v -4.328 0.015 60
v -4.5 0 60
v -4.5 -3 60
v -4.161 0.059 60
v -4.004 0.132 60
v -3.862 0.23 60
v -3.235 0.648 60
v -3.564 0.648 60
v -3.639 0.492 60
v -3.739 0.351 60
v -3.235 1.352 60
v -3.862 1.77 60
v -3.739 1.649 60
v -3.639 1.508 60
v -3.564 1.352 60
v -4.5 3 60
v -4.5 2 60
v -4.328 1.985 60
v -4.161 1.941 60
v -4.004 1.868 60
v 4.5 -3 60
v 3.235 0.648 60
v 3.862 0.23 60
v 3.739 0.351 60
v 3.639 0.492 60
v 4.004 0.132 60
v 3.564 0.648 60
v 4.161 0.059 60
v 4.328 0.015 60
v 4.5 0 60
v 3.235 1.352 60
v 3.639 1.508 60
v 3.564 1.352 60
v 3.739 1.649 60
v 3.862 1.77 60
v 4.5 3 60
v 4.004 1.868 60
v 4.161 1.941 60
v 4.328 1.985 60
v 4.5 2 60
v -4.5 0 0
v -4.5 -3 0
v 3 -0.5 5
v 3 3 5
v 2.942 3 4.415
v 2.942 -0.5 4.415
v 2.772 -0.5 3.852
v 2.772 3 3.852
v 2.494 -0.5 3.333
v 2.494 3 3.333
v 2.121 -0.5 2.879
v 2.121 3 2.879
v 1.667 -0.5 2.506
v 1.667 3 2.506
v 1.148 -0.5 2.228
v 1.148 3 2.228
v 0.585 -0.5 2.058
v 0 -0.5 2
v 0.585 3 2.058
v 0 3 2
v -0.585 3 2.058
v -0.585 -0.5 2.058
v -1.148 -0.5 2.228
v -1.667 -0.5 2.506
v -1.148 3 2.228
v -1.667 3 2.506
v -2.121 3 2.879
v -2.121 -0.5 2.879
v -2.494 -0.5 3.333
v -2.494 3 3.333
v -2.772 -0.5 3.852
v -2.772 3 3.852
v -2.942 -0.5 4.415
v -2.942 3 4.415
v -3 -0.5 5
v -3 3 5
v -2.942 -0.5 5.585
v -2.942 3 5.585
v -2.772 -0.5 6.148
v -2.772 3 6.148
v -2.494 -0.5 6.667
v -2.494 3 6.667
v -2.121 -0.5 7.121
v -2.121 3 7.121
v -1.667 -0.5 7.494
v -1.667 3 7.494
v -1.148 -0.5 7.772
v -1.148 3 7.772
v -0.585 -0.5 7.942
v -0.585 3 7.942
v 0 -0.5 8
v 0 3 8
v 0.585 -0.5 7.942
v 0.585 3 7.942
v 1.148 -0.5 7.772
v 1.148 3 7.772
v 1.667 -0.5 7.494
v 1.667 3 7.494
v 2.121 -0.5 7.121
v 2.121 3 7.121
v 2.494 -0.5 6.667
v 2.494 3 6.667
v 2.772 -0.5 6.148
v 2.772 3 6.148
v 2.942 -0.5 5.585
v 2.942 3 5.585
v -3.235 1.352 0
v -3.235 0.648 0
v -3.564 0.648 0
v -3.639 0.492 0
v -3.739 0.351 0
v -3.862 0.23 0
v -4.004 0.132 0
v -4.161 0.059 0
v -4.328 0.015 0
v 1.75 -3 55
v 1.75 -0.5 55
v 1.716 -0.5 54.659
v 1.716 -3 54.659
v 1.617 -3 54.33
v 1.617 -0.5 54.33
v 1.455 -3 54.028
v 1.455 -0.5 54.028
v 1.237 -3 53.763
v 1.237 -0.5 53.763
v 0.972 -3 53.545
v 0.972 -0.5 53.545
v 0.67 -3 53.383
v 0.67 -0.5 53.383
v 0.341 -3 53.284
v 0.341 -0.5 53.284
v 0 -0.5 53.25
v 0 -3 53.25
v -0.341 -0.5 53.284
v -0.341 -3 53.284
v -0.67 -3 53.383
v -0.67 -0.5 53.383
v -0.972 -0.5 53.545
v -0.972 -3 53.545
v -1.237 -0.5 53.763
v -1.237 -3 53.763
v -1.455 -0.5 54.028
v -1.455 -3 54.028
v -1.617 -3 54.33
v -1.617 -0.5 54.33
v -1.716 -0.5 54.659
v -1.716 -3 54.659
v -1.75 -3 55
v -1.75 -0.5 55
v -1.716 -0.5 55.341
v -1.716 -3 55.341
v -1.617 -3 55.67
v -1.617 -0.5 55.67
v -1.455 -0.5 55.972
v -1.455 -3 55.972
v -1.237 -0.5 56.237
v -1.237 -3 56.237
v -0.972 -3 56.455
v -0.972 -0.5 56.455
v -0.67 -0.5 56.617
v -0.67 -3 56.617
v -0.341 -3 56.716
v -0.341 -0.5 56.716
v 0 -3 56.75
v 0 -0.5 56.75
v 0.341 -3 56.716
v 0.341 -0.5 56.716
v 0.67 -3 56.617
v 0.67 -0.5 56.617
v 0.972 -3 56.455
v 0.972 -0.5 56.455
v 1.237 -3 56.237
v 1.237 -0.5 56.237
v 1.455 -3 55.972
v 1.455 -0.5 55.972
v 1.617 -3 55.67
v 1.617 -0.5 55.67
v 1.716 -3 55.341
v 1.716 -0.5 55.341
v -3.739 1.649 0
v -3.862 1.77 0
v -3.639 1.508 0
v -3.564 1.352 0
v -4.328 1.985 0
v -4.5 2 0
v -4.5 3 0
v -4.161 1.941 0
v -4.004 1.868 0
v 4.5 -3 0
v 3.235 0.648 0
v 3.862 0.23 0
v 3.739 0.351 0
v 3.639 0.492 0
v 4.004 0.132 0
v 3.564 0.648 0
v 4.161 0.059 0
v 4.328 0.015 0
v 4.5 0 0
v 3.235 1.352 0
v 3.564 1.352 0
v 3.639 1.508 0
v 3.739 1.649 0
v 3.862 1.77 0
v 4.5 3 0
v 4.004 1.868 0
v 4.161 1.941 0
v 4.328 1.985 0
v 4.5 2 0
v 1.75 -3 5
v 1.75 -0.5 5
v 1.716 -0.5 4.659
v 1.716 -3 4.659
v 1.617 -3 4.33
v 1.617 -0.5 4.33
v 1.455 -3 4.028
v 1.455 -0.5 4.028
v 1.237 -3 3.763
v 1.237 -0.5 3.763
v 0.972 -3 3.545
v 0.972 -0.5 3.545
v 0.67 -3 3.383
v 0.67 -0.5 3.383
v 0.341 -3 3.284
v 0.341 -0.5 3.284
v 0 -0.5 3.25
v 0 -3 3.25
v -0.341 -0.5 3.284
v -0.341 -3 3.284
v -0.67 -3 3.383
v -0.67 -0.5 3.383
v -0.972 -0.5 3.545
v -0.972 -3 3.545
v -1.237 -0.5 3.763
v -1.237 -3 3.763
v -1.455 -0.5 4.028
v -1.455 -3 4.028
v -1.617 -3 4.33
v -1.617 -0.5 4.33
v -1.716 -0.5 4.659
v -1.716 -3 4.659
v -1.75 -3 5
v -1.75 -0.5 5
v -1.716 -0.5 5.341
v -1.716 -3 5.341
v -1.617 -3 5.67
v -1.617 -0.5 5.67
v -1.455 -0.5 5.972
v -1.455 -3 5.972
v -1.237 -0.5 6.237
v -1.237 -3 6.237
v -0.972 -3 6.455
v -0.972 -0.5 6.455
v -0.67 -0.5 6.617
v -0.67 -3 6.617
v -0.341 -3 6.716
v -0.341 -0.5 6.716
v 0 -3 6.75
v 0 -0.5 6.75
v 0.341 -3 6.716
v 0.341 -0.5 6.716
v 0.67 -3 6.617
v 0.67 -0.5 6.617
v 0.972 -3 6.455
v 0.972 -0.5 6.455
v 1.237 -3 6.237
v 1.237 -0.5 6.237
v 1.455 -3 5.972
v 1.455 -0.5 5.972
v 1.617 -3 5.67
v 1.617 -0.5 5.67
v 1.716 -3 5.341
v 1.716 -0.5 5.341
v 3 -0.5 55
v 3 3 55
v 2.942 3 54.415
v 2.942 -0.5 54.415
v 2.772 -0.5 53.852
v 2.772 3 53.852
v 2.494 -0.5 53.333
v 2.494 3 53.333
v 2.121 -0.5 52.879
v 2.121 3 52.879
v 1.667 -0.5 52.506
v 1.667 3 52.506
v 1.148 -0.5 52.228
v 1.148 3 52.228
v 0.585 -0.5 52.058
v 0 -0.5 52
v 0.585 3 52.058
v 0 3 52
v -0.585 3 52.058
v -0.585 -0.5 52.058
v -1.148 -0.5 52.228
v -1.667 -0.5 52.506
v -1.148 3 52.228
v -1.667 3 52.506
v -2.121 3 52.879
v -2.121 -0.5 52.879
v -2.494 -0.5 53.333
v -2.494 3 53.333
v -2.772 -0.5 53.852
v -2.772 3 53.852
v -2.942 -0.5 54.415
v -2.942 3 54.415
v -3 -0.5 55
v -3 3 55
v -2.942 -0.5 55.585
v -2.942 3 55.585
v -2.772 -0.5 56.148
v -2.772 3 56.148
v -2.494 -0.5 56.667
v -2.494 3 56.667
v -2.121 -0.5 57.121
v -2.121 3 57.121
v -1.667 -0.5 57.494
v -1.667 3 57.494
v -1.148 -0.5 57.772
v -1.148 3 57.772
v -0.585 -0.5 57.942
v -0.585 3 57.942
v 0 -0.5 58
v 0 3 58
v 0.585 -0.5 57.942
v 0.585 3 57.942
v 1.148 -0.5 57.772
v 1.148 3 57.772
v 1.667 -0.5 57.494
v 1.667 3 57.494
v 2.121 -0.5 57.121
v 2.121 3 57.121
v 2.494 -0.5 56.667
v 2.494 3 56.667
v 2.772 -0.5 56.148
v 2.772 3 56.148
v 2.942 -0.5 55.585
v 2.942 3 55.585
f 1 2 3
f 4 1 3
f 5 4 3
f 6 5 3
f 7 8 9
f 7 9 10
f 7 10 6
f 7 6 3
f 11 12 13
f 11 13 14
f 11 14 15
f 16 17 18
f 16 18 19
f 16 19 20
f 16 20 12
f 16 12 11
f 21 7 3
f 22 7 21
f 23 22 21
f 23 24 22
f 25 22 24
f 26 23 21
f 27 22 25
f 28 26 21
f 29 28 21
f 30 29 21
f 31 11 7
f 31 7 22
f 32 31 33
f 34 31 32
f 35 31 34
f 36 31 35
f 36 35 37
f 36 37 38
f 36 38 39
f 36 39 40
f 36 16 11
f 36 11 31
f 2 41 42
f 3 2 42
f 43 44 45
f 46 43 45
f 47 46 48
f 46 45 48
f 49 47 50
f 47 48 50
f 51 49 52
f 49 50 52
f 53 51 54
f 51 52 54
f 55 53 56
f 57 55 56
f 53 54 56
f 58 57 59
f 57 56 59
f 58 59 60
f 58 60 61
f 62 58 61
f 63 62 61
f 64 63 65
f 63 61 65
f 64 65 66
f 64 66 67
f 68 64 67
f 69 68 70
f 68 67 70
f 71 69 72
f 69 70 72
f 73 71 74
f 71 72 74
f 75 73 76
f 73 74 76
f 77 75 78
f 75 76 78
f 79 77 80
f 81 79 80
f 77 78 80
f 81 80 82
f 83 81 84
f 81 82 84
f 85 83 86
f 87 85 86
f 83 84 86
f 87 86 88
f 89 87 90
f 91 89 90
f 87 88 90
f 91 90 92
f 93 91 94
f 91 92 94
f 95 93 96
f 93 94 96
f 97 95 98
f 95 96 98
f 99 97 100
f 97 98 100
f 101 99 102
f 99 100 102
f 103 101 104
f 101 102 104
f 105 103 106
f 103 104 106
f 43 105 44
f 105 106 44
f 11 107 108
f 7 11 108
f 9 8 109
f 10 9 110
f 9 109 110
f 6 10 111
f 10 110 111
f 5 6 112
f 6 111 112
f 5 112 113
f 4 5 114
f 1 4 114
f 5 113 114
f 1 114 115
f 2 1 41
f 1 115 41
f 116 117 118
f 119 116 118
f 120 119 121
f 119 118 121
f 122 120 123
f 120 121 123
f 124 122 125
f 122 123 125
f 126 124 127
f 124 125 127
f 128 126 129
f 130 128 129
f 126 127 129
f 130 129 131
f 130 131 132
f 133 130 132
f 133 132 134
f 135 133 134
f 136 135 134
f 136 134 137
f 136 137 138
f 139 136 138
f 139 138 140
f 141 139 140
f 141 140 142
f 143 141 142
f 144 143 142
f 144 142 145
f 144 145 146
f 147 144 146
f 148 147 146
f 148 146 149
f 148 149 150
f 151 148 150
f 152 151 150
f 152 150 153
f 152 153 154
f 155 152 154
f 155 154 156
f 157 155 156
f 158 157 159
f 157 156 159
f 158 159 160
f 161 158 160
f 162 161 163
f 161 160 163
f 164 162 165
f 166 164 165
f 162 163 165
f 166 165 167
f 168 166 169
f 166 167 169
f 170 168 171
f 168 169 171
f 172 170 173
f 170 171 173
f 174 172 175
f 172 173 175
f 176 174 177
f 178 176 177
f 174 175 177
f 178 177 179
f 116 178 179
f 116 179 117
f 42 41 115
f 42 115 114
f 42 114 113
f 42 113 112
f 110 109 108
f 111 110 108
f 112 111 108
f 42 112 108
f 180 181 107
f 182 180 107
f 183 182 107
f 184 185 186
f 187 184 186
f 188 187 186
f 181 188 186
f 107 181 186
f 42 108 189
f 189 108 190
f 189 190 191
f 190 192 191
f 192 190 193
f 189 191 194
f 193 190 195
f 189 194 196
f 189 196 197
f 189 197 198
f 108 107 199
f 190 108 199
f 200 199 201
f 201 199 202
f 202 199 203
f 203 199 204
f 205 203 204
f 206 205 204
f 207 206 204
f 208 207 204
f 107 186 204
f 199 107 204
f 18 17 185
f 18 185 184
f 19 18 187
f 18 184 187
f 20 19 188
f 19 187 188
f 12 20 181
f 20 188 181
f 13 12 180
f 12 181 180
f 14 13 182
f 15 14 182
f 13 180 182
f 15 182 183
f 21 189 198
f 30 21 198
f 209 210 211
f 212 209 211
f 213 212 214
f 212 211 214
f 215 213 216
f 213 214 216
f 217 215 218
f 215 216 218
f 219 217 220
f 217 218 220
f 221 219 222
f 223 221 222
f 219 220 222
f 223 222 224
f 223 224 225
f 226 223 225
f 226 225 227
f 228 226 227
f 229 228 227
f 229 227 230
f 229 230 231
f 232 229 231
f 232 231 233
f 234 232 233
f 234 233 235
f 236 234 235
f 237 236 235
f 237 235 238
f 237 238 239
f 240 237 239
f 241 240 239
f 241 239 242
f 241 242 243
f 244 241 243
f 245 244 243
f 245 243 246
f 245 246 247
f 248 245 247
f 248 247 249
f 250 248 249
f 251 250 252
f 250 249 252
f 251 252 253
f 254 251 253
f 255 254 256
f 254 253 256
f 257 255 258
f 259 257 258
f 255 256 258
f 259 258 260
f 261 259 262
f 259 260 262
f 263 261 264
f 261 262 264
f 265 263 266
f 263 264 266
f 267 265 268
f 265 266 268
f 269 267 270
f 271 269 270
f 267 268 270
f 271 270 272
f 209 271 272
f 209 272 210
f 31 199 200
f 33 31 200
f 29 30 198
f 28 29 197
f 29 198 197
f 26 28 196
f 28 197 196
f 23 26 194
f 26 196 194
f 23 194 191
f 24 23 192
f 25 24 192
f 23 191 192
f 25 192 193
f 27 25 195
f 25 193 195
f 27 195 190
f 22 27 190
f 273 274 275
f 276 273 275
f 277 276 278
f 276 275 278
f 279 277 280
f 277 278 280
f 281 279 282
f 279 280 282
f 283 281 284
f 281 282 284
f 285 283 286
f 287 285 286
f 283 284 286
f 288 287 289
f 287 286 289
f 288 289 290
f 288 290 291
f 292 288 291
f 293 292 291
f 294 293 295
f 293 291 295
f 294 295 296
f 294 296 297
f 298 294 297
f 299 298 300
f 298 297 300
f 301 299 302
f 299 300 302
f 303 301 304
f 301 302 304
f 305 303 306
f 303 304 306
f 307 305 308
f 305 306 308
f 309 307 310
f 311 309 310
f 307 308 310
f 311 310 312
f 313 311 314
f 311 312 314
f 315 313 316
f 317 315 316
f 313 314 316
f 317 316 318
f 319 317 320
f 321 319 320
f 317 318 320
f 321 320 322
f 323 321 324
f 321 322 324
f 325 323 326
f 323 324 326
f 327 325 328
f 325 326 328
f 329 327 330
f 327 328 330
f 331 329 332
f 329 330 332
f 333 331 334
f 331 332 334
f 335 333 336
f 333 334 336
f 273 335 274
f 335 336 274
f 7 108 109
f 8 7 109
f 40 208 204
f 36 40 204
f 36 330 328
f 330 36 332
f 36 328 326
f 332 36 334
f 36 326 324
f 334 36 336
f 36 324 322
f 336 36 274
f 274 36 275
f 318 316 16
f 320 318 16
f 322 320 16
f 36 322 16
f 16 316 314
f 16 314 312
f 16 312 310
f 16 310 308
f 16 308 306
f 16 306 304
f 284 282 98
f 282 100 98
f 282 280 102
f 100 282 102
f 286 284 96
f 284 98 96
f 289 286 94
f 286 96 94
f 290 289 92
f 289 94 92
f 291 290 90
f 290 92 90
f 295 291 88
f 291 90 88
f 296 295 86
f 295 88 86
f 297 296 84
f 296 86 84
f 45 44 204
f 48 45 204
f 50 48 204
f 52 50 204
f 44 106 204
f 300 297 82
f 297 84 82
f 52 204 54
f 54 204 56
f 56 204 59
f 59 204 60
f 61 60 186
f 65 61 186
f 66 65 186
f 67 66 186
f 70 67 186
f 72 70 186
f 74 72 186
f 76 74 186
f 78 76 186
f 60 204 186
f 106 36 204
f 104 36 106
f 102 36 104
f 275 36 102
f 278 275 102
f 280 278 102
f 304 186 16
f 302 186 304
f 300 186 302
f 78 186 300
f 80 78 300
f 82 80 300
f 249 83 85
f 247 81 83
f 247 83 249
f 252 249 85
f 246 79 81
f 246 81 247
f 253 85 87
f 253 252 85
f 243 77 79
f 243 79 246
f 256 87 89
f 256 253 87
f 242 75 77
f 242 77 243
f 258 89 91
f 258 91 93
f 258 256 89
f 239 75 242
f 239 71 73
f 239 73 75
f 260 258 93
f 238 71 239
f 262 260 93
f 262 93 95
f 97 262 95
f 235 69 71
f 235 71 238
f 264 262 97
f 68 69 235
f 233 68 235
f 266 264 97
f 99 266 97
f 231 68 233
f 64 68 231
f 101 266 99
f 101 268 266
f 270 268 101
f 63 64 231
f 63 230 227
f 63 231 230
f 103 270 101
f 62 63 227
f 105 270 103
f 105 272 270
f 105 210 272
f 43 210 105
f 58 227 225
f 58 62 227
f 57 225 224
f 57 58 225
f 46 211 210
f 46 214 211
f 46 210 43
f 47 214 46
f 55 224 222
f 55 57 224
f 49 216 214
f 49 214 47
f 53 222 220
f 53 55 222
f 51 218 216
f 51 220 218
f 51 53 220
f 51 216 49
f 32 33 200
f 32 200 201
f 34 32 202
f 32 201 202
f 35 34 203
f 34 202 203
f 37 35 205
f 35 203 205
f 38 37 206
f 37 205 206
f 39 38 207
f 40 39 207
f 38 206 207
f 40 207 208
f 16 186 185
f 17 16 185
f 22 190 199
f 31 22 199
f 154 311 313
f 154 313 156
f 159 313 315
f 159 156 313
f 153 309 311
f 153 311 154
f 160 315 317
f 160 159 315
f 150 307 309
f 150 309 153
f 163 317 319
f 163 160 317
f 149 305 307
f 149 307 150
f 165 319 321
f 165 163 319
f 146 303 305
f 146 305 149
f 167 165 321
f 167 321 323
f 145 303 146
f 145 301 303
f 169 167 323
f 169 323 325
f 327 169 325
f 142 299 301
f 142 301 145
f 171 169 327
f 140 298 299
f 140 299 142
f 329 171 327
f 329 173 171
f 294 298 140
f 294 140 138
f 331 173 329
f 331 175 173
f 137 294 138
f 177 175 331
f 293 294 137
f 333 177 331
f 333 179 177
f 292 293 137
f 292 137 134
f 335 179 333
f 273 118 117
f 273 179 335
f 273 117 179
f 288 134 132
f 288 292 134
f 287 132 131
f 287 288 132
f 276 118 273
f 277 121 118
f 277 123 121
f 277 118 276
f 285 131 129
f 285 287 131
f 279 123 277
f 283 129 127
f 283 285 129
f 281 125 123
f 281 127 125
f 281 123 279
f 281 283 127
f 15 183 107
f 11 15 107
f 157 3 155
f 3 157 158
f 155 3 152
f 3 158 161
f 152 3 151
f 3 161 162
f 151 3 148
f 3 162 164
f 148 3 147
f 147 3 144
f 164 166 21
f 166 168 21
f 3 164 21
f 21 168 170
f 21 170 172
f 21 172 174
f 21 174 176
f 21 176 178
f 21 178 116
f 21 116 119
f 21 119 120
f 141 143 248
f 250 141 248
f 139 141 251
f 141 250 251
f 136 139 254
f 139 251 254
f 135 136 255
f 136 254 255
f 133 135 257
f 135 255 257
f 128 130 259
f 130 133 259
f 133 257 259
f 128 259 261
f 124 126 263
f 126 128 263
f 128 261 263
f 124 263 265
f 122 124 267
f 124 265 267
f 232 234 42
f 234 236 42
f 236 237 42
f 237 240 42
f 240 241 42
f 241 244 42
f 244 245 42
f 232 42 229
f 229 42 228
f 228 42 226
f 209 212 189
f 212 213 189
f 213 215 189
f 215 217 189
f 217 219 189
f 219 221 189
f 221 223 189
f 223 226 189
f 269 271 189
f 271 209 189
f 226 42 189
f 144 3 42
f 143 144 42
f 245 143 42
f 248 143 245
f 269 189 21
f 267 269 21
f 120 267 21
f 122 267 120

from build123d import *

# Parameters (mm, degrees)
EXTRUDE1_DEPTH  = 60
SKETCH2_R       = 3
EXTRUDE2_DEPTH  = 3.5
SKETCH_R        = 1.75
EXTRUDE3_DEPTH  = 7
LPATTERN1_COUNT = 45
LPATTERN1_PITCH = 50


with BuildPart() as part:
    # Sketch1 → Extrude1 (new body)
    with BuildSketch(Plane.XY):
        with BuildLine():
            Line((-4.5, -3), (4.5, -3))
            Line((4.5, -3), (4.5, 0))
            ThreePointArc((4.5, 0), (3.93077967, 0.177814974), (3.563991137, 0.648023568))
            Line((3.563991137, 0.648023568), (3.235073025, 0.648023568))
            Line((3.235073025, 0.648023568), (3.235073025, 1.351976432))
            Line((3.235073025, 1.351976432), (3.563991137, 1.351976432))
            ThreePointArc((3.563991137, 1.351976432), (3.93077967, 1.822185026), (4.5, 2))
            Line((4.5, 2), (4.5, 3))
            Line((4.5, 3), (-4.5, 3))
            Line((-4.5, 3), (-4.5, 2))
            ThreePointArc((-4.5, 2), (-3.93077967, 1.822185026), (-3.563991137, 1.351976432))
            Line((-3.563991137, 1.351976432), (-3.235073025, 1.351976432))
            Line((-3.235073025, 1.351976432), (-3.235073025, 0.648023568))
            Line((-3.235073025, 0.648023568), (-3.563991137, 0.648023568))
            ThreePointArc((-3.563991137, 0.648023568), (-3.93077967, 0.177814974), (-4.5, 0))
            Line((-4.5, 0), (-4.5, -3))
        make_face()
    extrude(amount=EXTRUDE1_DEPTH)

    # Sketch2 → Extrude2 (cut)
    with BuildSketch(Plane(origin=(0, 3, 0), x_dir=(1, 0, 0), z_dir=(0, 1, 0))):
        with Locations((0, -5)):
            Circle(SKETCH2_R)
    extrude2 = extrude(amount=-EXTRUDE2_DEPTH, mode=Mode.SUBTRACT)

    # Sketch → Extrude3 (cut, through all)
    with BuildSketch(Plane(origin=(0, 3, 0), x_dir=(1, 0, 0), z_dir=(0, 1, 0))):
        with Locations((0, -5)):
            Circle(SKETCH_R)
    extrude3 = extrude(amount=-EXTRUDE3_DEPTH, mode=Mode.SUBTRACT)

    # LPattern1: Extrude2, Extrude3 ×45
    with Locations(*[(0, 0, i * LPATTERN1_PITCH) for i in range(1, LPATTERN1_COUNT)]):
        add(extrude2, mode=Mode.SUBTRACT)
        add(extrude3, mode=Mode.SUBTRACT)


solid = part.part
